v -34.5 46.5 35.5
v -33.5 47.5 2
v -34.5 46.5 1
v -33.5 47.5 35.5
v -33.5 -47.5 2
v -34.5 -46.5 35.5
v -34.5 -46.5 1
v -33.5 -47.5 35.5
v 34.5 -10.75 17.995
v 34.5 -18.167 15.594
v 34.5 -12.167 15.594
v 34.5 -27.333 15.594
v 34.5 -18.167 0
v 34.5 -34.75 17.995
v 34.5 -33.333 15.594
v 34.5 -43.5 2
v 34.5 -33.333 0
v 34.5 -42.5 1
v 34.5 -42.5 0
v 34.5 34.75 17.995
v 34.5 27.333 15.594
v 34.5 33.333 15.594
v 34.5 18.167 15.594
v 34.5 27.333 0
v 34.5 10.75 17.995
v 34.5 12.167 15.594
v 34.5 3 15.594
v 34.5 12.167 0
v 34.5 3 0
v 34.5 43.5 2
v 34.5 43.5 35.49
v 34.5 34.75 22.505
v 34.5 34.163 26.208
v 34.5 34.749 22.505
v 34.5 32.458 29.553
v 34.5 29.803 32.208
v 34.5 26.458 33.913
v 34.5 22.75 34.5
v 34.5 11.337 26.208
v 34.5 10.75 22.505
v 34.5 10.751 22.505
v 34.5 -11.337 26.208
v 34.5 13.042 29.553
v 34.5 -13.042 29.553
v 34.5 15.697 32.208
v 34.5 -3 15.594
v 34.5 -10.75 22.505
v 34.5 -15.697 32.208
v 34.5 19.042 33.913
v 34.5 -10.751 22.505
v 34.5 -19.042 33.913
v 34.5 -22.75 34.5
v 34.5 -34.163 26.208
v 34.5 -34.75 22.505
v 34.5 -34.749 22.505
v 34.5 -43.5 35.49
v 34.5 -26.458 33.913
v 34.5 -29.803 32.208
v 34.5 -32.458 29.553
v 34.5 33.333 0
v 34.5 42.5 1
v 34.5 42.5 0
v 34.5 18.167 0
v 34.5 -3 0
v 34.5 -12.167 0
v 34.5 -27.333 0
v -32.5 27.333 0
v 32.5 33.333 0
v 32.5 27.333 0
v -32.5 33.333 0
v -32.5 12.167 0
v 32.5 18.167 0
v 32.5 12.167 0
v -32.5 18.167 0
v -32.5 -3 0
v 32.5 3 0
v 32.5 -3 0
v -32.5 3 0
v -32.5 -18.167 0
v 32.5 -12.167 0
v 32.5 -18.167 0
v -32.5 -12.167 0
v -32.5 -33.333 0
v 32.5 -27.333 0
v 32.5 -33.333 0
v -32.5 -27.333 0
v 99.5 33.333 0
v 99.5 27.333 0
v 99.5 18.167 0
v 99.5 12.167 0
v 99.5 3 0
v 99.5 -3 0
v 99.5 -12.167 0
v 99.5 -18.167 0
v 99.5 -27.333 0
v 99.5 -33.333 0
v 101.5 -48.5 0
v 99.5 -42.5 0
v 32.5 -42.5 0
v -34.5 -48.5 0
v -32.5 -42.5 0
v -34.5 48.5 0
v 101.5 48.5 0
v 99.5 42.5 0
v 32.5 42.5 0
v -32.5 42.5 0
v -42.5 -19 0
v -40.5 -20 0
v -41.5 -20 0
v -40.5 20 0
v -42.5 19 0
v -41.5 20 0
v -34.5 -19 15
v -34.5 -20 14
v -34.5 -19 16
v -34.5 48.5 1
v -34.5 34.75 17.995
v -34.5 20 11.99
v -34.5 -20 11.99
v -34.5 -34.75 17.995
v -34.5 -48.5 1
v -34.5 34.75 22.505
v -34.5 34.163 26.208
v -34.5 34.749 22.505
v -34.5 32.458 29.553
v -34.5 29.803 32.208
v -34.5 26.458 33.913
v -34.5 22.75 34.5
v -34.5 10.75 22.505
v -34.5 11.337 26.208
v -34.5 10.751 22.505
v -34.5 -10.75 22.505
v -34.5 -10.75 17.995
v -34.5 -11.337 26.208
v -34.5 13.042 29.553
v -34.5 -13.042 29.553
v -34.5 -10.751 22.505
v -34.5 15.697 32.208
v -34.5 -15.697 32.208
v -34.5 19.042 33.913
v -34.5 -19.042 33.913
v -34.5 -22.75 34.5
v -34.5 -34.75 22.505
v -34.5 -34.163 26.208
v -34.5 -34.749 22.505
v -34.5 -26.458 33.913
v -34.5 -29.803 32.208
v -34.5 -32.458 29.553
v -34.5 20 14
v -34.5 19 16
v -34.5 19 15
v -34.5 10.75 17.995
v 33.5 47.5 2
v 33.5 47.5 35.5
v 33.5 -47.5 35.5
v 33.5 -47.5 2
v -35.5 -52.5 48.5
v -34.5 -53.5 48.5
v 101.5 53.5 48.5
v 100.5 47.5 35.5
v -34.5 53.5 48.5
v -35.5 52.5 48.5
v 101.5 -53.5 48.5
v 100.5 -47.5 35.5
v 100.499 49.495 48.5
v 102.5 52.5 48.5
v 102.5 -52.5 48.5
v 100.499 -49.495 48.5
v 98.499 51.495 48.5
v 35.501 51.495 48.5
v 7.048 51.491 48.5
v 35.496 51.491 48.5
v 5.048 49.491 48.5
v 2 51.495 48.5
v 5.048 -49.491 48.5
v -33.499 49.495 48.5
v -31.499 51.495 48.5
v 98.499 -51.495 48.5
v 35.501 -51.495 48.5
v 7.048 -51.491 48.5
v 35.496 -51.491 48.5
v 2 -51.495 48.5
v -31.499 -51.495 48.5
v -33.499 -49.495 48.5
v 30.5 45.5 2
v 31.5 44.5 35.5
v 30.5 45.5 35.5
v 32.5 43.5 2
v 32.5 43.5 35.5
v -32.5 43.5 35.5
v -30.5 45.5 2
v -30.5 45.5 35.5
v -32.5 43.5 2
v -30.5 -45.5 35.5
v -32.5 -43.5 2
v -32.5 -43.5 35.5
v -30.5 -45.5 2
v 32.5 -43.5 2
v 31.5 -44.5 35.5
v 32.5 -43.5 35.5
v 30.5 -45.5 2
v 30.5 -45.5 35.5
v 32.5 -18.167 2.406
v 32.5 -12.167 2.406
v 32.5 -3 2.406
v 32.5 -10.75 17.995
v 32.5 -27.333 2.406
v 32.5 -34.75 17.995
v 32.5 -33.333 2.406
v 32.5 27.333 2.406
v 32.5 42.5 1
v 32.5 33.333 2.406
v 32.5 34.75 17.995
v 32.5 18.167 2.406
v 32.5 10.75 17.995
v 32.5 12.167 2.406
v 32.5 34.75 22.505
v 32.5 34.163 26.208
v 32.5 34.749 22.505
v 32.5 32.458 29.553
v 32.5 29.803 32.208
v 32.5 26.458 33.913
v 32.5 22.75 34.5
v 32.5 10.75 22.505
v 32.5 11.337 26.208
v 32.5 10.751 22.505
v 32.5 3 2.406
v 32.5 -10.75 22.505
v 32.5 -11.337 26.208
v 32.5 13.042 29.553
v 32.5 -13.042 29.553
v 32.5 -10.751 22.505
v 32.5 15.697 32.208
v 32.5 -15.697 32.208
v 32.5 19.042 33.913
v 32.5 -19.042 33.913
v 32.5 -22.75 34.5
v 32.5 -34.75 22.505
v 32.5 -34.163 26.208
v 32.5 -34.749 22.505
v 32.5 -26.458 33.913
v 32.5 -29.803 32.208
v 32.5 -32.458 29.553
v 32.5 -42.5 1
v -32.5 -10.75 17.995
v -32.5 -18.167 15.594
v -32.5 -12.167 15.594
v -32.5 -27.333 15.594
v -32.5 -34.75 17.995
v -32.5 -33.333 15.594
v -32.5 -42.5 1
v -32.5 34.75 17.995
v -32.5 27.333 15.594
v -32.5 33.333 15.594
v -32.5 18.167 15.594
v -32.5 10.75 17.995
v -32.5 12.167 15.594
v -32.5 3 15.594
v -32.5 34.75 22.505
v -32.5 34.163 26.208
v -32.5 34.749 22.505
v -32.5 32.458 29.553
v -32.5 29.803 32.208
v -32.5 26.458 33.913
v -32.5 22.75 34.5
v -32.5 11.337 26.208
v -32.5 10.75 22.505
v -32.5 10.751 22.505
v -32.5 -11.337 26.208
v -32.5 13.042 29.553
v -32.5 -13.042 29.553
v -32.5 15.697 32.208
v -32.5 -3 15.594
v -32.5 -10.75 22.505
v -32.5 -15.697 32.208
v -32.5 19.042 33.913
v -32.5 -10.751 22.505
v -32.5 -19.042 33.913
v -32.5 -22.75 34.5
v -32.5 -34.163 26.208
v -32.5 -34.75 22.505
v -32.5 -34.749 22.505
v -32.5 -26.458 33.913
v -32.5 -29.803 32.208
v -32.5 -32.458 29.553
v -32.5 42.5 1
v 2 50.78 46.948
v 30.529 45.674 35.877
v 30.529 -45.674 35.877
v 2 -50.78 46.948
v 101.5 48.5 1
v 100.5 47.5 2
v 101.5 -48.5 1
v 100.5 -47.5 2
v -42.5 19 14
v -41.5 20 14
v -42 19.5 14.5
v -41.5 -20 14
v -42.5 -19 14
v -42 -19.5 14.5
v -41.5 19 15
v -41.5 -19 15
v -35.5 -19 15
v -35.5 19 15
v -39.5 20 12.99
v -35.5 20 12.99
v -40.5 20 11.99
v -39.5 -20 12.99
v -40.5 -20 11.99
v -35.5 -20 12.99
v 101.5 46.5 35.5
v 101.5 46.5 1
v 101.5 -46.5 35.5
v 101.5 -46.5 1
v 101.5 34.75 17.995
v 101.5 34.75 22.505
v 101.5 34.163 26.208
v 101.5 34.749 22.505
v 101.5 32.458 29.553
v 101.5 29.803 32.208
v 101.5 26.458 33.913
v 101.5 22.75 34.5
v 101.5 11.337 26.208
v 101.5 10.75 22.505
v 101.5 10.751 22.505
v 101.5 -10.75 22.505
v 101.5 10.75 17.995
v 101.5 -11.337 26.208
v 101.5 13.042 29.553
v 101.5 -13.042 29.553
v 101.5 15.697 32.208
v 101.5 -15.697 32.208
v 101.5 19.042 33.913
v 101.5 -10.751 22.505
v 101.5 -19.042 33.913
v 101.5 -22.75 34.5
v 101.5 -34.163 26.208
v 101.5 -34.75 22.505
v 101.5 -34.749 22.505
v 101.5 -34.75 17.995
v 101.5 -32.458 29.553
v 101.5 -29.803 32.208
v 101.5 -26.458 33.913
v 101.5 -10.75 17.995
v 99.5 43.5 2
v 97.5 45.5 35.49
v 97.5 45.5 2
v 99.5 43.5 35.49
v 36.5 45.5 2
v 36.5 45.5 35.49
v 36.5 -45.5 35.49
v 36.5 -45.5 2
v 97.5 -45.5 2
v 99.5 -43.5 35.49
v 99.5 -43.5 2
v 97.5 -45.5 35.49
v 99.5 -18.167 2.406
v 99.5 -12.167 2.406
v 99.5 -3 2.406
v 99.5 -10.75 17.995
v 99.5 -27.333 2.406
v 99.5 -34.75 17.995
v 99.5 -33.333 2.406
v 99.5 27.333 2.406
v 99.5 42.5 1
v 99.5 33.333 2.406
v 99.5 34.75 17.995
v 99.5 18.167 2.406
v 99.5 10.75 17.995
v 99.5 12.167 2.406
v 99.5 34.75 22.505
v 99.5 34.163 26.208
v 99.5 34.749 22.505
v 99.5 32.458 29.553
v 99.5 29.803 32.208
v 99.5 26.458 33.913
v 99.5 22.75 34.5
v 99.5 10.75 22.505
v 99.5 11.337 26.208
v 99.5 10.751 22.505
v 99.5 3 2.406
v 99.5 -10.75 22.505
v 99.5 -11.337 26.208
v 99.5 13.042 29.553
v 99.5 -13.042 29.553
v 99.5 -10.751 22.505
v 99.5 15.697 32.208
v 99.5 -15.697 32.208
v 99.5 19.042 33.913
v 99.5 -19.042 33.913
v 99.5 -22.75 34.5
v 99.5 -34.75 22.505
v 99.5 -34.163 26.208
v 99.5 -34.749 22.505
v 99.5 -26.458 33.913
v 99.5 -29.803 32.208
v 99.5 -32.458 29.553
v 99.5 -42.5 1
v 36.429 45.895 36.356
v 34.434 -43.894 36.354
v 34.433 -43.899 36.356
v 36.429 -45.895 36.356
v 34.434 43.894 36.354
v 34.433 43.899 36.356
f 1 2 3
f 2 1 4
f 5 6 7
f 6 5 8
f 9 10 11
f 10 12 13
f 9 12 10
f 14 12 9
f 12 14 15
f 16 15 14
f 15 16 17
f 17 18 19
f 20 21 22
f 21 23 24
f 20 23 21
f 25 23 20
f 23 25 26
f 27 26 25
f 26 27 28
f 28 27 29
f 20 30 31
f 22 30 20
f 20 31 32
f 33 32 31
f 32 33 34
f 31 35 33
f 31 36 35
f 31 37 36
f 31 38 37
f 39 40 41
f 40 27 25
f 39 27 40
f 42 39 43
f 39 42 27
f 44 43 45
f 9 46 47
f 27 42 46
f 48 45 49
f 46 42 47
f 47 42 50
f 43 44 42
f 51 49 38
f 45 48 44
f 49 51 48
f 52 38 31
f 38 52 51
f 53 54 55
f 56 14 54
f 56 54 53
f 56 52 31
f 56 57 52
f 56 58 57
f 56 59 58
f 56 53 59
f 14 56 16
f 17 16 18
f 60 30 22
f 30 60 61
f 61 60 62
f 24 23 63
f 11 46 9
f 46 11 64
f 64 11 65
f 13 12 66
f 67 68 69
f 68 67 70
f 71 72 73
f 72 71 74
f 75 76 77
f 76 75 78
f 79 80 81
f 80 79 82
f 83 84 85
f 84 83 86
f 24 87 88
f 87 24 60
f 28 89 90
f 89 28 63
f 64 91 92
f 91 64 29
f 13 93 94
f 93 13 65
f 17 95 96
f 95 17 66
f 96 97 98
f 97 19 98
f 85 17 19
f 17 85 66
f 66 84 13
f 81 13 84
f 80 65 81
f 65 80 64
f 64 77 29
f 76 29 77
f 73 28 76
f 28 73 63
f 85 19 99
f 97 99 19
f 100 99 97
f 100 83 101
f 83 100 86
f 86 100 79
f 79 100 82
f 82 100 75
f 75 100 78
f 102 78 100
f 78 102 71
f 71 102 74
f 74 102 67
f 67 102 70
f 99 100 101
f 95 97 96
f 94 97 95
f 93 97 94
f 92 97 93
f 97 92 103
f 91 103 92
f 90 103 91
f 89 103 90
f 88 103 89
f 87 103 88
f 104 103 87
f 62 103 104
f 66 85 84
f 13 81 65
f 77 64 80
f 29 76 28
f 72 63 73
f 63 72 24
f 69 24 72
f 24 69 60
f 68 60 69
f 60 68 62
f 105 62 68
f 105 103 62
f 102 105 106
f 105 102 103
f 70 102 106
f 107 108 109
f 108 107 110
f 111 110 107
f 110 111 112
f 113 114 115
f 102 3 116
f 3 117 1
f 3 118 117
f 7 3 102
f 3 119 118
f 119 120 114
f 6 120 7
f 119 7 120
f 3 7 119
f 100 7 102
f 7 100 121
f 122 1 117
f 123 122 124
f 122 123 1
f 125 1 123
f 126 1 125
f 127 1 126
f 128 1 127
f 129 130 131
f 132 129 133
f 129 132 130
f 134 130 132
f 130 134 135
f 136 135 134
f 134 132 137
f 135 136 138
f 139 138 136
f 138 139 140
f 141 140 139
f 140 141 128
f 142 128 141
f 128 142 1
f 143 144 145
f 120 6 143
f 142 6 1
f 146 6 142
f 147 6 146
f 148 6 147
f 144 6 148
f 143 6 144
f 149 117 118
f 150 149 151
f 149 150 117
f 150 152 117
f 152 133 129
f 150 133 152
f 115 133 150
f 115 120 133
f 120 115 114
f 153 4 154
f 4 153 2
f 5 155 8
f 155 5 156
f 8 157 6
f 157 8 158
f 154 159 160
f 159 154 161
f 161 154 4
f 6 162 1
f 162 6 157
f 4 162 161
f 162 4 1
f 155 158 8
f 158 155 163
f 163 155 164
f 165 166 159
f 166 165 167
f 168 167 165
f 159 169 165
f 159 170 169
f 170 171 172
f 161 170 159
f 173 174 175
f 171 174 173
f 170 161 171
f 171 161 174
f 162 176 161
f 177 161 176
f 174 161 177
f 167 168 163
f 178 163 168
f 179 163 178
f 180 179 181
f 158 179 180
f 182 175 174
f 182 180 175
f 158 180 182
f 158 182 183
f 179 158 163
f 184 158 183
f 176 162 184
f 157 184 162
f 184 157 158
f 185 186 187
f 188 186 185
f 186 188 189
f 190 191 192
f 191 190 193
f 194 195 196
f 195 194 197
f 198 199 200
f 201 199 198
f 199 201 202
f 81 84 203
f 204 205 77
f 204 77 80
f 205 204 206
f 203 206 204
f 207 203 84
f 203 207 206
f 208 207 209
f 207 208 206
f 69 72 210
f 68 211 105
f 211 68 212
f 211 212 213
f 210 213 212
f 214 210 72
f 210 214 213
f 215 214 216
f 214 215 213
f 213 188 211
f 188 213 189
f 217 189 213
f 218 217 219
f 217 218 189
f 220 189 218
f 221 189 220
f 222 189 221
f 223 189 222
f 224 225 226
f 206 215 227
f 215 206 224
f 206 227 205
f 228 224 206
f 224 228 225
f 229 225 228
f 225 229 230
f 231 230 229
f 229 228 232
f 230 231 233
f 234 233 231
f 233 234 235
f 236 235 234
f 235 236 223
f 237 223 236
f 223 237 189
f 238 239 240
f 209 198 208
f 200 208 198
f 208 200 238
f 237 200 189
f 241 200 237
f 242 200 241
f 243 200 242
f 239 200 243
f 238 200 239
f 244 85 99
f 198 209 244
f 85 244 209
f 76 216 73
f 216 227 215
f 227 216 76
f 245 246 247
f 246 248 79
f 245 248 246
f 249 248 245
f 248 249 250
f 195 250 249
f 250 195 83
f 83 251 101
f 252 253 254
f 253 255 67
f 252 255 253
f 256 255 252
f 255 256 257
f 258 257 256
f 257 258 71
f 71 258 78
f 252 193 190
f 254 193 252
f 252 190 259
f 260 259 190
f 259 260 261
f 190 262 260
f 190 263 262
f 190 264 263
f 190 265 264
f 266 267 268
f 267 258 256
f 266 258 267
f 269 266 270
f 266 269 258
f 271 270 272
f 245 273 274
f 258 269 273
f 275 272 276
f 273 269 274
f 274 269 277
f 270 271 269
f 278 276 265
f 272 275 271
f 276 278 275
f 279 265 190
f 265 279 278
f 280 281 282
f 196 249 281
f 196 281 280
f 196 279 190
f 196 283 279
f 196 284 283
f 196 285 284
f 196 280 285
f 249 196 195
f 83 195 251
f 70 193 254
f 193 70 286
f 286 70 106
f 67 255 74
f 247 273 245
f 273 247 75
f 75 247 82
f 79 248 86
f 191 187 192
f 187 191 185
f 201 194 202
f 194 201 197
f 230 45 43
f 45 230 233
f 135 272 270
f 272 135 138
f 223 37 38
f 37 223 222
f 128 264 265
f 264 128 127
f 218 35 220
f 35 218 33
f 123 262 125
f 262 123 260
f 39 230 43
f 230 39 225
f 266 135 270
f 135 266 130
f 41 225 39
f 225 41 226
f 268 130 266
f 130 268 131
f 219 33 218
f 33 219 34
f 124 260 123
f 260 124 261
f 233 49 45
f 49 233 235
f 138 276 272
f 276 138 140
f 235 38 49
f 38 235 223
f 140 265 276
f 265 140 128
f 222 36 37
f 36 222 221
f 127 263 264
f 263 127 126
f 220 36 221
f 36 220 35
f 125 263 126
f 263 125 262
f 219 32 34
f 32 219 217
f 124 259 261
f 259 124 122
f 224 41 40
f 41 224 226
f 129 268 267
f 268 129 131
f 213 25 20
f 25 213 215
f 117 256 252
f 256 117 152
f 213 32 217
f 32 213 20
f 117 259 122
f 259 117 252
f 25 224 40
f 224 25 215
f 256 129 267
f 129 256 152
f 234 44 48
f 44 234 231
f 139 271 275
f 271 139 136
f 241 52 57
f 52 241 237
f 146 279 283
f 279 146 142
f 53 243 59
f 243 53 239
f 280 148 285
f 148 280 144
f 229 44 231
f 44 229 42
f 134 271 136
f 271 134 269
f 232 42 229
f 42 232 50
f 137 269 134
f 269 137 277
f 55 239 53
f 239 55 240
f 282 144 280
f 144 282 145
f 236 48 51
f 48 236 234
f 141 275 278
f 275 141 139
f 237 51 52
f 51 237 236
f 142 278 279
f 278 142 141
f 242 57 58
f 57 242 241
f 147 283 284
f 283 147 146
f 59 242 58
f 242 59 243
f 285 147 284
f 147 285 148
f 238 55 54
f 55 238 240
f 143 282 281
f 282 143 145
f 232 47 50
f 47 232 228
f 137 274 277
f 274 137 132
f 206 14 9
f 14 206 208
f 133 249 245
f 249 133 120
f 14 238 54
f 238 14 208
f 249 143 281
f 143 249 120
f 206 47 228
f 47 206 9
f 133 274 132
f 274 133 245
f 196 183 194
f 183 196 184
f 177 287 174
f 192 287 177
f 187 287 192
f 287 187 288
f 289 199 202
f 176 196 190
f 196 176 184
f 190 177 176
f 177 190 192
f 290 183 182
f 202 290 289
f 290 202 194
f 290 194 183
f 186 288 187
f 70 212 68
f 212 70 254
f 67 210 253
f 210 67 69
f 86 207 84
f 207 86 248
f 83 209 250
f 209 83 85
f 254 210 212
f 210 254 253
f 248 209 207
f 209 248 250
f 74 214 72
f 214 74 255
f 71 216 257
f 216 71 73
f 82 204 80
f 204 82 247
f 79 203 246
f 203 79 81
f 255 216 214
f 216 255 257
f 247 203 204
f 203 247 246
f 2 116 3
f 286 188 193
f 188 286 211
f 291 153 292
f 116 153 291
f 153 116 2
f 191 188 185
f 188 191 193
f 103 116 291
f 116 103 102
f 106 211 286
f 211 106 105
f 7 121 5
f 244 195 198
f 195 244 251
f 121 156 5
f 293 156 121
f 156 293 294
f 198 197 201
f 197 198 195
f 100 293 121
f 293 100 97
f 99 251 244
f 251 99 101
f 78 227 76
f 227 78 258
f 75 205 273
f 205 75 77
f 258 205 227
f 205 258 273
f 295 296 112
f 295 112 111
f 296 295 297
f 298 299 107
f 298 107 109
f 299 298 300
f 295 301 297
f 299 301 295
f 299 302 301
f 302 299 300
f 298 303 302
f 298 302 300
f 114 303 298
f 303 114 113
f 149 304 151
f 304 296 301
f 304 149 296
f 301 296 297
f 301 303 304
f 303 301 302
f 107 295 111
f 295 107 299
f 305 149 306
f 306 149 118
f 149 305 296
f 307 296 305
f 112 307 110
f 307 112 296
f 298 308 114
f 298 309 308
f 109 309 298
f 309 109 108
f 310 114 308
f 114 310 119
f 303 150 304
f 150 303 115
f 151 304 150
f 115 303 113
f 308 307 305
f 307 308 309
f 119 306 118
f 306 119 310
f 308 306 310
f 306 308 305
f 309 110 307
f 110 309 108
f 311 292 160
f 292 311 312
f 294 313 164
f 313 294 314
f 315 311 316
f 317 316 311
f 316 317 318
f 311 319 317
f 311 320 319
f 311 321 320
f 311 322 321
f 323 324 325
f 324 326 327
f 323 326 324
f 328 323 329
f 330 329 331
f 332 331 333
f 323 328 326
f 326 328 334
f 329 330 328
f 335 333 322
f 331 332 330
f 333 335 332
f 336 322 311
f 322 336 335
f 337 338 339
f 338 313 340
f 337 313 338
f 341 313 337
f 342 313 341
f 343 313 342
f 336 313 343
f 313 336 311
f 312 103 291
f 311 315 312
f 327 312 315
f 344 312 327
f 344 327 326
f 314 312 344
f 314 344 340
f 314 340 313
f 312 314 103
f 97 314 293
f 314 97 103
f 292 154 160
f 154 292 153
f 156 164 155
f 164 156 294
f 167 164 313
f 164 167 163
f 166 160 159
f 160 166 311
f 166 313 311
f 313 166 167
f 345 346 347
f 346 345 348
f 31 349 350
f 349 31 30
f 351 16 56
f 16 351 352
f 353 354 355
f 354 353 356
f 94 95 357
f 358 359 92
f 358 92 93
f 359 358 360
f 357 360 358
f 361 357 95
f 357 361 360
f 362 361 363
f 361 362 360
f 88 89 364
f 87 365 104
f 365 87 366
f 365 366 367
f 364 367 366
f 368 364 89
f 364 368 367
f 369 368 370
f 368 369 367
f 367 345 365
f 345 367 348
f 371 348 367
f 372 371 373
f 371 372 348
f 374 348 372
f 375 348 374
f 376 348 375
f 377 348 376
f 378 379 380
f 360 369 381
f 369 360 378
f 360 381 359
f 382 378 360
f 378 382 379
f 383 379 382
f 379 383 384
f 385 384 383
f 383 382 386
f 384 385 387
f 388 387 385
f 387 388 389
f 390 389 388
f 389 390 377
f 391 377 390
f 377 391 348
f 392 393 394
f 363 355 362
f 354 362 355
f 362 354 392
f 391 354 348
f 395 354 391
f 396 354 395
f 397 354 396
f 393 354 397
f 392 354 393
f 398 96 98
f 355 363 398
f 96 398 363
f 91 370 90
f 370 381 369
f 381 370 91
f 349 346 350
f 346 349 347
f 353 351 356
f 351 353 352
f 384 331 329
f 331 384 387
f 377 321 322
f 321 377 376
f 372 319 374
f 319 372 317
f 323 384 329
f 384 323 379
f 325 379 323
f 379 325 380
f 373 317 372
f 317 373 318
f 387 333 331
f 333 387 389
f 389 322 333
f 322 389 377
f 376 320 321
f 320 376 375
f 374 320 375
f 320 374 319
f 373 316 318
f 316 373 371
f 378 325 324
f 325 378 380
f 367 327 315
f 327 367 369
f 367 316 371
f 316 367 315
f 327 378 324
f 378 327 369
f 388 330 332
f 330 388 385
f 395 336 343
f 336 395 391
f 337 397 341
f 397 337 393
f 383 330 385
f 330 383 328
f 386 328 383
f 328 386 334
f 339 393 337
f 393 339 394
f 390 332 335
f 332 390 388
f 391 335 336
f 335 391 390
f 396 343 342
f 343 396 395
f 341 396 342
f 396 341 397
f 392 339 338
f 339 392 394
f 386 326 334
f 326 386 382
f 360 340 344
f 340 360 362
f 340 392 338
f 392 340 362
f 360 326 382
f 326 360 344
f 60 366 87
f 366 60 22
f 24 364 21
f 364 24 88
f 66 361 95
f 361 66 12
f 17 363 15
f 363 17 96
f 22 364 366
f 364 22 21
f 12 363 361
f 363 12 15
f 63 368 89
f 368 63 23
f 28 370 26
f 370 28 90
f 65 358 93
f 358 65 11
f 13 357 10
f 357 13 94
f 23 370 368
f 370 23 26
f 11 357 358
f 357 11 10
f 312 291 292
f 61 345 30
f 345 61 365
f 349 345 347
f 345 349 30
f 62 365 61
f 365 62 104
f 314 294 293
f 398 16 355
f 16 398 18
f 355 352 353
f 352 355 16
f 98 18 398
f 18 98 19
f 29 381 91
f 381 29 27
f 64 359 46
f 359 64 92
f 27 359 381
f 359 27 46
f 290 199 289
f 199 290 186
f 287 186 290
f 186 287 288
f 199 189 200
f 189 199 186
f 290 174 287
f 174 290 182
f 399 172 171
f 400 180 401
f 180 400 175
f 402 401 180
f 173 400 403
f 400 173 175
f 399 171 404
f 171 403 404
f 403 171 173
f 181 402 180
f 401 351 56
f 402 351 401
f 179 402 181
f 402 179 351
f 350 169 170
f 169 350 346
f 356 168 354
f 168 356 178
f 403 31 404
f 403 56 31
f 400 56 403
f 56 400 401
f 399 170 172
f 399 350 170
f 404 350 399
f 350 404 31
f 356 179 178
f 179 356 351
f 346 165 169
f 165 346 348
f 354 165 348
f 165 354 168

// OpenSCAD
/*

  tcsm_double_basket.scad
  
  2021 (c) olikraus@gmail.com

  This work is licensed under the Creative Commons Attribution-NonCommercial-ShareAlike 4.0 International License.
  To view a copy of this license, visit http://creativecommons.org/licenses/by-nc-sa/4.0/.

 6 Jun 2021
  - Lower total height --> DONE
  - Shrink side openings --> DONE
  
 12 Jun 2021
  - Close smaller openings --> DONE
  - Make a ramp with the bottom lines (raw_baskeet)
      --> DONE

*/

include <trading_card_compare_machine.scad>;




//translate([-card_width*1.15,0,0])
//sorter_house();
ccm_double_basket();
//ccm_basket();
